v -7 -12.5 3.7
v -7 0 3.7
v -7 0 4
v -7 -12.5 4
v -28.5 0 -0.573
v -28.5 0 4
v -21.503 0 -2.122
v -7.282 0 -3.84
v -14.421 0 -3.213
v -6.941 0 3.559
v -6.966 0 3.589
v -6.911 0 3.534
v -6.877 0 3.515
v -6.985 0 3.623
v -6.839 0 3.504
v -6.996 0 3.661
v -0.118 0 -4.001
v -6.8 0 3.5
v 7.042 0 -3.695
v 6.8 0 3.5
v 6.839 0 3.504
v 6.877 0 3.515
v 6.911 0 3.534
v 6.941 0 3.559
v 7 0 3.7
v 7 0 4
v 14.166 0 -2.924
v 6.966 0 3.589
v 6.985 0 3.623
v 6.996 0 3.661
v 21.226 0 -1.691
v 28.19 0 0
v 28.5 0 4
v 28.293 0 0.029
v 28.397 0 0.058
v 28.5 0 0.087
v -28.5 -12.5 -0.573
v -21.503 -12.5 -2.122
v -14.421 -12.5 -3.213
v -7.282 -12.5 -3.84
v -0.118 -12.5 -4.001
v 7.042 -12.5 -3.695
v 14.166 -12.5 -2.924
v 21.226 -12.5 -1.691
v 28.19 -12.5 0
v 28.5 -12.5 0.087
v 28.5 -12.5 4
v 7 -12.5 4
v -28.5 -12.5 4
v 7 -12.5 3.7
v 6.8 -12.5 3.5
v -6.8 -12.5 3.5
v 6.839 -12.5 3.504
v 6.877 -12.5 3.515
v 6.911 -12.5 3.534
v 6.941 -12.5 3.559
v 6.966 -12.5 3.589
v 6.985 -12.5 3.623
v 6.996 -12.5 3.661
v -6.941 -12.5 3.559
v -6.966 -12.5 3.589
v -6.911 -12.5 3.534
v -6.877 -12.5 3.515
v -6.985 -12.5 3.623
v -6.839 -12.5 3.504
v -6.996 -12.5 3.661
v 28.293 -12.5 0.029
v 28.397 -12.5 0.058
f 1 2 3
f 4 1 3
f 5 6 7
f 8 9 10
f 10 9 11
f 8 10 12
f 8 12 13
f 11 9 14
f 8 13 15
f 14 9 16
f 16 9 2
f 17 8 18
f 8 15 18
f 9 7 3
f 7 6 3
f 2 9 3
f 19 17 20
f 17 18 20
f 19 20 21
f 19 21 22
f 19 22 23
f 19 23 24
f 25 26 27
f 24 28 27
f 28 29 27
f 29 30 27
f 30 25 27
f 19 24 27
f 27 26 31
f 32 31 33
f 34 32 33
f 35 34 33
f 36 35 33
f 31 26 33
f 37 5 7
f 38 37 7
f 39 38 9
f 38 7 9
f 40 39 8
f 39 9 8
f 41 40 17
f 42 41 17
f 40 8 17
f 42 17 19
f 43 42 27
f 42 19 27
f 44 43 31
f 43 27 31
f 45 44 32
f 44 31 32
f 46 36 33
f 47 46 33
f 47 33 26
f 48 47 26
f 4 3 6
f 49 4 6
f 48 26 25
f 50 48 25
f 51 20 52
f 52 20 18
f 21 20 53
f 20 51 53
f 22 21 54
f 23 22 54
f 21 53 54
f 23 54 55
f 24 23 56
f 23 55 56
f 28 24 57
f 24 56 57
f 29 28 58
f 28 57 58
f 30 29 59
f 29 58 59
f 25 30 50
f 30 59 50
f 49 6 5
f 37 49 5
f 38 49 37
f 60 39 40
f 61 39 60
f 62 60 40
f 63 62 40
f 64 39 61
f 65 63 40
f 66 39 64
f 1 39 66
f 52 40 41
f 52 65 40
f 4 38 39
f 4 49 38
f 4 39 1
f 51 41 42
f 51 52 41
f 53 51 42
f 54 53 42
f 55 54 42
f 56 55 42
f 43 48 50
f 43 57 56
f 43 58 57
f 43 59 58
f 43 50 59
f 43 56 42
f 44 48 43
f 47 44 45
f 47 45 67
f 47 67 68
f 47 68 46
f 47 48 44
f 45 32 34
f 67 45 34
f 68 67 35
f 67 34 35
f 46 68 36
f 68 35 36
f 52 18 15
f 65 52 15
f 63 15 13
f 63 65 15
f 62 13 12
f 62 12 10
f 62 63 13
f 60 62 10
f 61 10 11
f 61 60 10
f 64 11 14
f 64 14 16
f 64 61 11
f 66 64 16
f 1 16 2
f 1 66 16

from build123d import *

# Parameters (mm, degrees)
F1_DEPTH = 12.5
F2_R     = 0.2
F3_R     = 0.2


with BuildPart() as f1:
    # F0 (on Front) → F1 (new body)
    with BuildSketch(Plane.XZ):
        with BuildLine():
            Line((28.5, 4), (7, 4))
            Line((7, 4), (7, 3.5))
            Line((7, 3.5), (0, 3.5))
            Line((0, 3.5), (-7, 3.5))
            Line((-7, 3.5), (-7, 4))
            Line((-7, 4), (-28.5, 4))
            Line((-28.5, 4), (-28.5, 0))
            Line((-28.5, 0), (-28.5, -0.572795))
            ThreePointArc((-28.5, -0.572795), (-0.117692, -4.001252), (28.189545, 0))
            ThreePointArc((28.189545, 0), (28.344804, 0.043215), (28.5, 0.086657))
            Line((28.5, 0.086657), (28.5, 4))
        make_face()
    extrude(amount=F1_DEPTH)

    # F2
    f2_edges = [f1.edges().sort_by_distance(p)[0] for p in [
        (-7, -6.25, 3.5),
    ]]
    fillet(f2_edges, radius=F2_R)

    # F3
    f3_edges = [f1.edges().sort_by_distance(p)[0] for p in [
        (7, -6.25, 3.5),
    ]]
    fillet(f3_edges, radius=F3_R)


solid = f1.part
